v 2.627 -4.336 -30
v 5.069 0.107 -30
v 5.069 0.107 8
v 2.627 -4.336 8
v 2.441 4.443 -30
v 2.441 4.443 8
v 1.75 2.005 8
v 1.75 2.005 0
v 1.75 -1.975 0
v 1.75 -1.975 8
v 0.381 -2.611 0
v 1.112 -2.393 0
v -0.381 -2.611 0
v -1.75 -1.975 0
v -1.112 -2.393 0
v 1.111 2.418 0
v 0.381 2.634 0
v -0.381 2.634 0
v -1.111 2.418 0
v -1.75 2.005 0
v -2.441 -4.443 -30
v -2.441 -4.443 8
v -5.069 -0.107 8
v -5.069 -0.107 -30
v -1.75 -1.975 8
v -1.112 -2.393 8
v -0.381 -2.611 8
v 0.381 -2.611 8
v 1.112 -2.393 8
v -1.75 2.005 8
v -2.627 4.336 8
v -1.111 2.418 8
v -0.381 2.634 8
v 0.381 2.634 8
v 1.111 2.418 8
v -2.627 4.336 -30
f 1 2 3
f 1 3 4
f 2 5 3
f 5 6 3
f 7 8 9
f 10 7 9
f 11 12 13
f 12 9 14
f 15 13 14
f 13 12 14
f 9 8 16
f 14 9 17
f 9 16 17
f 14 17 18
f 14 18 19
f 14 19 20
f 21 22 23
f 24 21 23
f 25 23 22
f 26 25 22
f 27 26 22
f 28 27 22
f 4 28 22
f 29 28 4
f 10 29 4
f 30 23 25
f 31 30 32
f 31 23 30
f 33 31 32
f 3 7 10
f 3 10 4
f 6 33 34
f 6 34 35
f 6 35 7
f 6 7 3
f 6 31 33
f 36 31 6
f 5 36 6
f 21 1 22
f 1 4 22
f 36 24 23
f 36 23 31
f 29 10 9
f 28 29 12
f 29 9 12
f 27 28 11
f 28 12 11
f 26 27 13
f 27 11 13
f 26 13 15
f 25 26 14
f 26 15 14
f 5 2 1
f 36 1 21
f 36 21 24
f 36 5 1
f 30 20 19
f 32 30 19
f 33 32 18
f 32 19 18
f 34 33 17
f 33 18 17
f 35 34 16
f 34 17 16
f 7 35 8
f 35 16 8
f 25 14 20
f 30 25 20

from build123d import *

# Parameters (mm, degrees)
BOSS_EXTRUDE1_DEPTH = 8
BOSS_EXTRUDE2_DEPTH = 30


with BuildPart() as part:
    # Sketch1 → Boss-Extrude1 (new body)
    with BuildSketch(Plane.XY):
        Polygon((2.441453407, 4.443445202), (-2.627409721, 4.336083274), (-5.068863129, -0.107361928), (-2.441453407, -4.443445202), (2.627409721, -4.336083274), (5.068863129, 0.107361928), align=None)
        with BuildLine():
            Line((1.75, 2.004770405), (1.75, -1.975229595))
            ThreePointArc((1.75, -1.975229595), (0, -2.638945235), (-1.75, -1.975229595))
            Line((-1.75, -1.975229595), (-1.75, 2.004770405))
            ThreePointArc((-1.75, 2.004770405), (0, 2.661128403), (1.75, 2.004770405))
        make_face(mode=Mode.SUBTRACT)
    extrude(amount=BOSS_EXTRUDE1_DEPTH)

    # Sketch2 → Boss-Extrude2 (add)
    with BuildSketch(Plane(origin=(0, 0, 0), x_dir=(-1, 0, 0), z_dir=(0, 0, -1))):
        Polygon((2.627409721, 4.336083274), (-2.441453407, 4.443445202), (-5.068863129, 0.107361928), (-2.627409721, -4.336083274), (2.441453407, -4.443445202), (5.068863129, -0.107361928), align=None)
    extrude(amount=BOSS_EXTRUDE2_DEPTH)


solid = part.part
